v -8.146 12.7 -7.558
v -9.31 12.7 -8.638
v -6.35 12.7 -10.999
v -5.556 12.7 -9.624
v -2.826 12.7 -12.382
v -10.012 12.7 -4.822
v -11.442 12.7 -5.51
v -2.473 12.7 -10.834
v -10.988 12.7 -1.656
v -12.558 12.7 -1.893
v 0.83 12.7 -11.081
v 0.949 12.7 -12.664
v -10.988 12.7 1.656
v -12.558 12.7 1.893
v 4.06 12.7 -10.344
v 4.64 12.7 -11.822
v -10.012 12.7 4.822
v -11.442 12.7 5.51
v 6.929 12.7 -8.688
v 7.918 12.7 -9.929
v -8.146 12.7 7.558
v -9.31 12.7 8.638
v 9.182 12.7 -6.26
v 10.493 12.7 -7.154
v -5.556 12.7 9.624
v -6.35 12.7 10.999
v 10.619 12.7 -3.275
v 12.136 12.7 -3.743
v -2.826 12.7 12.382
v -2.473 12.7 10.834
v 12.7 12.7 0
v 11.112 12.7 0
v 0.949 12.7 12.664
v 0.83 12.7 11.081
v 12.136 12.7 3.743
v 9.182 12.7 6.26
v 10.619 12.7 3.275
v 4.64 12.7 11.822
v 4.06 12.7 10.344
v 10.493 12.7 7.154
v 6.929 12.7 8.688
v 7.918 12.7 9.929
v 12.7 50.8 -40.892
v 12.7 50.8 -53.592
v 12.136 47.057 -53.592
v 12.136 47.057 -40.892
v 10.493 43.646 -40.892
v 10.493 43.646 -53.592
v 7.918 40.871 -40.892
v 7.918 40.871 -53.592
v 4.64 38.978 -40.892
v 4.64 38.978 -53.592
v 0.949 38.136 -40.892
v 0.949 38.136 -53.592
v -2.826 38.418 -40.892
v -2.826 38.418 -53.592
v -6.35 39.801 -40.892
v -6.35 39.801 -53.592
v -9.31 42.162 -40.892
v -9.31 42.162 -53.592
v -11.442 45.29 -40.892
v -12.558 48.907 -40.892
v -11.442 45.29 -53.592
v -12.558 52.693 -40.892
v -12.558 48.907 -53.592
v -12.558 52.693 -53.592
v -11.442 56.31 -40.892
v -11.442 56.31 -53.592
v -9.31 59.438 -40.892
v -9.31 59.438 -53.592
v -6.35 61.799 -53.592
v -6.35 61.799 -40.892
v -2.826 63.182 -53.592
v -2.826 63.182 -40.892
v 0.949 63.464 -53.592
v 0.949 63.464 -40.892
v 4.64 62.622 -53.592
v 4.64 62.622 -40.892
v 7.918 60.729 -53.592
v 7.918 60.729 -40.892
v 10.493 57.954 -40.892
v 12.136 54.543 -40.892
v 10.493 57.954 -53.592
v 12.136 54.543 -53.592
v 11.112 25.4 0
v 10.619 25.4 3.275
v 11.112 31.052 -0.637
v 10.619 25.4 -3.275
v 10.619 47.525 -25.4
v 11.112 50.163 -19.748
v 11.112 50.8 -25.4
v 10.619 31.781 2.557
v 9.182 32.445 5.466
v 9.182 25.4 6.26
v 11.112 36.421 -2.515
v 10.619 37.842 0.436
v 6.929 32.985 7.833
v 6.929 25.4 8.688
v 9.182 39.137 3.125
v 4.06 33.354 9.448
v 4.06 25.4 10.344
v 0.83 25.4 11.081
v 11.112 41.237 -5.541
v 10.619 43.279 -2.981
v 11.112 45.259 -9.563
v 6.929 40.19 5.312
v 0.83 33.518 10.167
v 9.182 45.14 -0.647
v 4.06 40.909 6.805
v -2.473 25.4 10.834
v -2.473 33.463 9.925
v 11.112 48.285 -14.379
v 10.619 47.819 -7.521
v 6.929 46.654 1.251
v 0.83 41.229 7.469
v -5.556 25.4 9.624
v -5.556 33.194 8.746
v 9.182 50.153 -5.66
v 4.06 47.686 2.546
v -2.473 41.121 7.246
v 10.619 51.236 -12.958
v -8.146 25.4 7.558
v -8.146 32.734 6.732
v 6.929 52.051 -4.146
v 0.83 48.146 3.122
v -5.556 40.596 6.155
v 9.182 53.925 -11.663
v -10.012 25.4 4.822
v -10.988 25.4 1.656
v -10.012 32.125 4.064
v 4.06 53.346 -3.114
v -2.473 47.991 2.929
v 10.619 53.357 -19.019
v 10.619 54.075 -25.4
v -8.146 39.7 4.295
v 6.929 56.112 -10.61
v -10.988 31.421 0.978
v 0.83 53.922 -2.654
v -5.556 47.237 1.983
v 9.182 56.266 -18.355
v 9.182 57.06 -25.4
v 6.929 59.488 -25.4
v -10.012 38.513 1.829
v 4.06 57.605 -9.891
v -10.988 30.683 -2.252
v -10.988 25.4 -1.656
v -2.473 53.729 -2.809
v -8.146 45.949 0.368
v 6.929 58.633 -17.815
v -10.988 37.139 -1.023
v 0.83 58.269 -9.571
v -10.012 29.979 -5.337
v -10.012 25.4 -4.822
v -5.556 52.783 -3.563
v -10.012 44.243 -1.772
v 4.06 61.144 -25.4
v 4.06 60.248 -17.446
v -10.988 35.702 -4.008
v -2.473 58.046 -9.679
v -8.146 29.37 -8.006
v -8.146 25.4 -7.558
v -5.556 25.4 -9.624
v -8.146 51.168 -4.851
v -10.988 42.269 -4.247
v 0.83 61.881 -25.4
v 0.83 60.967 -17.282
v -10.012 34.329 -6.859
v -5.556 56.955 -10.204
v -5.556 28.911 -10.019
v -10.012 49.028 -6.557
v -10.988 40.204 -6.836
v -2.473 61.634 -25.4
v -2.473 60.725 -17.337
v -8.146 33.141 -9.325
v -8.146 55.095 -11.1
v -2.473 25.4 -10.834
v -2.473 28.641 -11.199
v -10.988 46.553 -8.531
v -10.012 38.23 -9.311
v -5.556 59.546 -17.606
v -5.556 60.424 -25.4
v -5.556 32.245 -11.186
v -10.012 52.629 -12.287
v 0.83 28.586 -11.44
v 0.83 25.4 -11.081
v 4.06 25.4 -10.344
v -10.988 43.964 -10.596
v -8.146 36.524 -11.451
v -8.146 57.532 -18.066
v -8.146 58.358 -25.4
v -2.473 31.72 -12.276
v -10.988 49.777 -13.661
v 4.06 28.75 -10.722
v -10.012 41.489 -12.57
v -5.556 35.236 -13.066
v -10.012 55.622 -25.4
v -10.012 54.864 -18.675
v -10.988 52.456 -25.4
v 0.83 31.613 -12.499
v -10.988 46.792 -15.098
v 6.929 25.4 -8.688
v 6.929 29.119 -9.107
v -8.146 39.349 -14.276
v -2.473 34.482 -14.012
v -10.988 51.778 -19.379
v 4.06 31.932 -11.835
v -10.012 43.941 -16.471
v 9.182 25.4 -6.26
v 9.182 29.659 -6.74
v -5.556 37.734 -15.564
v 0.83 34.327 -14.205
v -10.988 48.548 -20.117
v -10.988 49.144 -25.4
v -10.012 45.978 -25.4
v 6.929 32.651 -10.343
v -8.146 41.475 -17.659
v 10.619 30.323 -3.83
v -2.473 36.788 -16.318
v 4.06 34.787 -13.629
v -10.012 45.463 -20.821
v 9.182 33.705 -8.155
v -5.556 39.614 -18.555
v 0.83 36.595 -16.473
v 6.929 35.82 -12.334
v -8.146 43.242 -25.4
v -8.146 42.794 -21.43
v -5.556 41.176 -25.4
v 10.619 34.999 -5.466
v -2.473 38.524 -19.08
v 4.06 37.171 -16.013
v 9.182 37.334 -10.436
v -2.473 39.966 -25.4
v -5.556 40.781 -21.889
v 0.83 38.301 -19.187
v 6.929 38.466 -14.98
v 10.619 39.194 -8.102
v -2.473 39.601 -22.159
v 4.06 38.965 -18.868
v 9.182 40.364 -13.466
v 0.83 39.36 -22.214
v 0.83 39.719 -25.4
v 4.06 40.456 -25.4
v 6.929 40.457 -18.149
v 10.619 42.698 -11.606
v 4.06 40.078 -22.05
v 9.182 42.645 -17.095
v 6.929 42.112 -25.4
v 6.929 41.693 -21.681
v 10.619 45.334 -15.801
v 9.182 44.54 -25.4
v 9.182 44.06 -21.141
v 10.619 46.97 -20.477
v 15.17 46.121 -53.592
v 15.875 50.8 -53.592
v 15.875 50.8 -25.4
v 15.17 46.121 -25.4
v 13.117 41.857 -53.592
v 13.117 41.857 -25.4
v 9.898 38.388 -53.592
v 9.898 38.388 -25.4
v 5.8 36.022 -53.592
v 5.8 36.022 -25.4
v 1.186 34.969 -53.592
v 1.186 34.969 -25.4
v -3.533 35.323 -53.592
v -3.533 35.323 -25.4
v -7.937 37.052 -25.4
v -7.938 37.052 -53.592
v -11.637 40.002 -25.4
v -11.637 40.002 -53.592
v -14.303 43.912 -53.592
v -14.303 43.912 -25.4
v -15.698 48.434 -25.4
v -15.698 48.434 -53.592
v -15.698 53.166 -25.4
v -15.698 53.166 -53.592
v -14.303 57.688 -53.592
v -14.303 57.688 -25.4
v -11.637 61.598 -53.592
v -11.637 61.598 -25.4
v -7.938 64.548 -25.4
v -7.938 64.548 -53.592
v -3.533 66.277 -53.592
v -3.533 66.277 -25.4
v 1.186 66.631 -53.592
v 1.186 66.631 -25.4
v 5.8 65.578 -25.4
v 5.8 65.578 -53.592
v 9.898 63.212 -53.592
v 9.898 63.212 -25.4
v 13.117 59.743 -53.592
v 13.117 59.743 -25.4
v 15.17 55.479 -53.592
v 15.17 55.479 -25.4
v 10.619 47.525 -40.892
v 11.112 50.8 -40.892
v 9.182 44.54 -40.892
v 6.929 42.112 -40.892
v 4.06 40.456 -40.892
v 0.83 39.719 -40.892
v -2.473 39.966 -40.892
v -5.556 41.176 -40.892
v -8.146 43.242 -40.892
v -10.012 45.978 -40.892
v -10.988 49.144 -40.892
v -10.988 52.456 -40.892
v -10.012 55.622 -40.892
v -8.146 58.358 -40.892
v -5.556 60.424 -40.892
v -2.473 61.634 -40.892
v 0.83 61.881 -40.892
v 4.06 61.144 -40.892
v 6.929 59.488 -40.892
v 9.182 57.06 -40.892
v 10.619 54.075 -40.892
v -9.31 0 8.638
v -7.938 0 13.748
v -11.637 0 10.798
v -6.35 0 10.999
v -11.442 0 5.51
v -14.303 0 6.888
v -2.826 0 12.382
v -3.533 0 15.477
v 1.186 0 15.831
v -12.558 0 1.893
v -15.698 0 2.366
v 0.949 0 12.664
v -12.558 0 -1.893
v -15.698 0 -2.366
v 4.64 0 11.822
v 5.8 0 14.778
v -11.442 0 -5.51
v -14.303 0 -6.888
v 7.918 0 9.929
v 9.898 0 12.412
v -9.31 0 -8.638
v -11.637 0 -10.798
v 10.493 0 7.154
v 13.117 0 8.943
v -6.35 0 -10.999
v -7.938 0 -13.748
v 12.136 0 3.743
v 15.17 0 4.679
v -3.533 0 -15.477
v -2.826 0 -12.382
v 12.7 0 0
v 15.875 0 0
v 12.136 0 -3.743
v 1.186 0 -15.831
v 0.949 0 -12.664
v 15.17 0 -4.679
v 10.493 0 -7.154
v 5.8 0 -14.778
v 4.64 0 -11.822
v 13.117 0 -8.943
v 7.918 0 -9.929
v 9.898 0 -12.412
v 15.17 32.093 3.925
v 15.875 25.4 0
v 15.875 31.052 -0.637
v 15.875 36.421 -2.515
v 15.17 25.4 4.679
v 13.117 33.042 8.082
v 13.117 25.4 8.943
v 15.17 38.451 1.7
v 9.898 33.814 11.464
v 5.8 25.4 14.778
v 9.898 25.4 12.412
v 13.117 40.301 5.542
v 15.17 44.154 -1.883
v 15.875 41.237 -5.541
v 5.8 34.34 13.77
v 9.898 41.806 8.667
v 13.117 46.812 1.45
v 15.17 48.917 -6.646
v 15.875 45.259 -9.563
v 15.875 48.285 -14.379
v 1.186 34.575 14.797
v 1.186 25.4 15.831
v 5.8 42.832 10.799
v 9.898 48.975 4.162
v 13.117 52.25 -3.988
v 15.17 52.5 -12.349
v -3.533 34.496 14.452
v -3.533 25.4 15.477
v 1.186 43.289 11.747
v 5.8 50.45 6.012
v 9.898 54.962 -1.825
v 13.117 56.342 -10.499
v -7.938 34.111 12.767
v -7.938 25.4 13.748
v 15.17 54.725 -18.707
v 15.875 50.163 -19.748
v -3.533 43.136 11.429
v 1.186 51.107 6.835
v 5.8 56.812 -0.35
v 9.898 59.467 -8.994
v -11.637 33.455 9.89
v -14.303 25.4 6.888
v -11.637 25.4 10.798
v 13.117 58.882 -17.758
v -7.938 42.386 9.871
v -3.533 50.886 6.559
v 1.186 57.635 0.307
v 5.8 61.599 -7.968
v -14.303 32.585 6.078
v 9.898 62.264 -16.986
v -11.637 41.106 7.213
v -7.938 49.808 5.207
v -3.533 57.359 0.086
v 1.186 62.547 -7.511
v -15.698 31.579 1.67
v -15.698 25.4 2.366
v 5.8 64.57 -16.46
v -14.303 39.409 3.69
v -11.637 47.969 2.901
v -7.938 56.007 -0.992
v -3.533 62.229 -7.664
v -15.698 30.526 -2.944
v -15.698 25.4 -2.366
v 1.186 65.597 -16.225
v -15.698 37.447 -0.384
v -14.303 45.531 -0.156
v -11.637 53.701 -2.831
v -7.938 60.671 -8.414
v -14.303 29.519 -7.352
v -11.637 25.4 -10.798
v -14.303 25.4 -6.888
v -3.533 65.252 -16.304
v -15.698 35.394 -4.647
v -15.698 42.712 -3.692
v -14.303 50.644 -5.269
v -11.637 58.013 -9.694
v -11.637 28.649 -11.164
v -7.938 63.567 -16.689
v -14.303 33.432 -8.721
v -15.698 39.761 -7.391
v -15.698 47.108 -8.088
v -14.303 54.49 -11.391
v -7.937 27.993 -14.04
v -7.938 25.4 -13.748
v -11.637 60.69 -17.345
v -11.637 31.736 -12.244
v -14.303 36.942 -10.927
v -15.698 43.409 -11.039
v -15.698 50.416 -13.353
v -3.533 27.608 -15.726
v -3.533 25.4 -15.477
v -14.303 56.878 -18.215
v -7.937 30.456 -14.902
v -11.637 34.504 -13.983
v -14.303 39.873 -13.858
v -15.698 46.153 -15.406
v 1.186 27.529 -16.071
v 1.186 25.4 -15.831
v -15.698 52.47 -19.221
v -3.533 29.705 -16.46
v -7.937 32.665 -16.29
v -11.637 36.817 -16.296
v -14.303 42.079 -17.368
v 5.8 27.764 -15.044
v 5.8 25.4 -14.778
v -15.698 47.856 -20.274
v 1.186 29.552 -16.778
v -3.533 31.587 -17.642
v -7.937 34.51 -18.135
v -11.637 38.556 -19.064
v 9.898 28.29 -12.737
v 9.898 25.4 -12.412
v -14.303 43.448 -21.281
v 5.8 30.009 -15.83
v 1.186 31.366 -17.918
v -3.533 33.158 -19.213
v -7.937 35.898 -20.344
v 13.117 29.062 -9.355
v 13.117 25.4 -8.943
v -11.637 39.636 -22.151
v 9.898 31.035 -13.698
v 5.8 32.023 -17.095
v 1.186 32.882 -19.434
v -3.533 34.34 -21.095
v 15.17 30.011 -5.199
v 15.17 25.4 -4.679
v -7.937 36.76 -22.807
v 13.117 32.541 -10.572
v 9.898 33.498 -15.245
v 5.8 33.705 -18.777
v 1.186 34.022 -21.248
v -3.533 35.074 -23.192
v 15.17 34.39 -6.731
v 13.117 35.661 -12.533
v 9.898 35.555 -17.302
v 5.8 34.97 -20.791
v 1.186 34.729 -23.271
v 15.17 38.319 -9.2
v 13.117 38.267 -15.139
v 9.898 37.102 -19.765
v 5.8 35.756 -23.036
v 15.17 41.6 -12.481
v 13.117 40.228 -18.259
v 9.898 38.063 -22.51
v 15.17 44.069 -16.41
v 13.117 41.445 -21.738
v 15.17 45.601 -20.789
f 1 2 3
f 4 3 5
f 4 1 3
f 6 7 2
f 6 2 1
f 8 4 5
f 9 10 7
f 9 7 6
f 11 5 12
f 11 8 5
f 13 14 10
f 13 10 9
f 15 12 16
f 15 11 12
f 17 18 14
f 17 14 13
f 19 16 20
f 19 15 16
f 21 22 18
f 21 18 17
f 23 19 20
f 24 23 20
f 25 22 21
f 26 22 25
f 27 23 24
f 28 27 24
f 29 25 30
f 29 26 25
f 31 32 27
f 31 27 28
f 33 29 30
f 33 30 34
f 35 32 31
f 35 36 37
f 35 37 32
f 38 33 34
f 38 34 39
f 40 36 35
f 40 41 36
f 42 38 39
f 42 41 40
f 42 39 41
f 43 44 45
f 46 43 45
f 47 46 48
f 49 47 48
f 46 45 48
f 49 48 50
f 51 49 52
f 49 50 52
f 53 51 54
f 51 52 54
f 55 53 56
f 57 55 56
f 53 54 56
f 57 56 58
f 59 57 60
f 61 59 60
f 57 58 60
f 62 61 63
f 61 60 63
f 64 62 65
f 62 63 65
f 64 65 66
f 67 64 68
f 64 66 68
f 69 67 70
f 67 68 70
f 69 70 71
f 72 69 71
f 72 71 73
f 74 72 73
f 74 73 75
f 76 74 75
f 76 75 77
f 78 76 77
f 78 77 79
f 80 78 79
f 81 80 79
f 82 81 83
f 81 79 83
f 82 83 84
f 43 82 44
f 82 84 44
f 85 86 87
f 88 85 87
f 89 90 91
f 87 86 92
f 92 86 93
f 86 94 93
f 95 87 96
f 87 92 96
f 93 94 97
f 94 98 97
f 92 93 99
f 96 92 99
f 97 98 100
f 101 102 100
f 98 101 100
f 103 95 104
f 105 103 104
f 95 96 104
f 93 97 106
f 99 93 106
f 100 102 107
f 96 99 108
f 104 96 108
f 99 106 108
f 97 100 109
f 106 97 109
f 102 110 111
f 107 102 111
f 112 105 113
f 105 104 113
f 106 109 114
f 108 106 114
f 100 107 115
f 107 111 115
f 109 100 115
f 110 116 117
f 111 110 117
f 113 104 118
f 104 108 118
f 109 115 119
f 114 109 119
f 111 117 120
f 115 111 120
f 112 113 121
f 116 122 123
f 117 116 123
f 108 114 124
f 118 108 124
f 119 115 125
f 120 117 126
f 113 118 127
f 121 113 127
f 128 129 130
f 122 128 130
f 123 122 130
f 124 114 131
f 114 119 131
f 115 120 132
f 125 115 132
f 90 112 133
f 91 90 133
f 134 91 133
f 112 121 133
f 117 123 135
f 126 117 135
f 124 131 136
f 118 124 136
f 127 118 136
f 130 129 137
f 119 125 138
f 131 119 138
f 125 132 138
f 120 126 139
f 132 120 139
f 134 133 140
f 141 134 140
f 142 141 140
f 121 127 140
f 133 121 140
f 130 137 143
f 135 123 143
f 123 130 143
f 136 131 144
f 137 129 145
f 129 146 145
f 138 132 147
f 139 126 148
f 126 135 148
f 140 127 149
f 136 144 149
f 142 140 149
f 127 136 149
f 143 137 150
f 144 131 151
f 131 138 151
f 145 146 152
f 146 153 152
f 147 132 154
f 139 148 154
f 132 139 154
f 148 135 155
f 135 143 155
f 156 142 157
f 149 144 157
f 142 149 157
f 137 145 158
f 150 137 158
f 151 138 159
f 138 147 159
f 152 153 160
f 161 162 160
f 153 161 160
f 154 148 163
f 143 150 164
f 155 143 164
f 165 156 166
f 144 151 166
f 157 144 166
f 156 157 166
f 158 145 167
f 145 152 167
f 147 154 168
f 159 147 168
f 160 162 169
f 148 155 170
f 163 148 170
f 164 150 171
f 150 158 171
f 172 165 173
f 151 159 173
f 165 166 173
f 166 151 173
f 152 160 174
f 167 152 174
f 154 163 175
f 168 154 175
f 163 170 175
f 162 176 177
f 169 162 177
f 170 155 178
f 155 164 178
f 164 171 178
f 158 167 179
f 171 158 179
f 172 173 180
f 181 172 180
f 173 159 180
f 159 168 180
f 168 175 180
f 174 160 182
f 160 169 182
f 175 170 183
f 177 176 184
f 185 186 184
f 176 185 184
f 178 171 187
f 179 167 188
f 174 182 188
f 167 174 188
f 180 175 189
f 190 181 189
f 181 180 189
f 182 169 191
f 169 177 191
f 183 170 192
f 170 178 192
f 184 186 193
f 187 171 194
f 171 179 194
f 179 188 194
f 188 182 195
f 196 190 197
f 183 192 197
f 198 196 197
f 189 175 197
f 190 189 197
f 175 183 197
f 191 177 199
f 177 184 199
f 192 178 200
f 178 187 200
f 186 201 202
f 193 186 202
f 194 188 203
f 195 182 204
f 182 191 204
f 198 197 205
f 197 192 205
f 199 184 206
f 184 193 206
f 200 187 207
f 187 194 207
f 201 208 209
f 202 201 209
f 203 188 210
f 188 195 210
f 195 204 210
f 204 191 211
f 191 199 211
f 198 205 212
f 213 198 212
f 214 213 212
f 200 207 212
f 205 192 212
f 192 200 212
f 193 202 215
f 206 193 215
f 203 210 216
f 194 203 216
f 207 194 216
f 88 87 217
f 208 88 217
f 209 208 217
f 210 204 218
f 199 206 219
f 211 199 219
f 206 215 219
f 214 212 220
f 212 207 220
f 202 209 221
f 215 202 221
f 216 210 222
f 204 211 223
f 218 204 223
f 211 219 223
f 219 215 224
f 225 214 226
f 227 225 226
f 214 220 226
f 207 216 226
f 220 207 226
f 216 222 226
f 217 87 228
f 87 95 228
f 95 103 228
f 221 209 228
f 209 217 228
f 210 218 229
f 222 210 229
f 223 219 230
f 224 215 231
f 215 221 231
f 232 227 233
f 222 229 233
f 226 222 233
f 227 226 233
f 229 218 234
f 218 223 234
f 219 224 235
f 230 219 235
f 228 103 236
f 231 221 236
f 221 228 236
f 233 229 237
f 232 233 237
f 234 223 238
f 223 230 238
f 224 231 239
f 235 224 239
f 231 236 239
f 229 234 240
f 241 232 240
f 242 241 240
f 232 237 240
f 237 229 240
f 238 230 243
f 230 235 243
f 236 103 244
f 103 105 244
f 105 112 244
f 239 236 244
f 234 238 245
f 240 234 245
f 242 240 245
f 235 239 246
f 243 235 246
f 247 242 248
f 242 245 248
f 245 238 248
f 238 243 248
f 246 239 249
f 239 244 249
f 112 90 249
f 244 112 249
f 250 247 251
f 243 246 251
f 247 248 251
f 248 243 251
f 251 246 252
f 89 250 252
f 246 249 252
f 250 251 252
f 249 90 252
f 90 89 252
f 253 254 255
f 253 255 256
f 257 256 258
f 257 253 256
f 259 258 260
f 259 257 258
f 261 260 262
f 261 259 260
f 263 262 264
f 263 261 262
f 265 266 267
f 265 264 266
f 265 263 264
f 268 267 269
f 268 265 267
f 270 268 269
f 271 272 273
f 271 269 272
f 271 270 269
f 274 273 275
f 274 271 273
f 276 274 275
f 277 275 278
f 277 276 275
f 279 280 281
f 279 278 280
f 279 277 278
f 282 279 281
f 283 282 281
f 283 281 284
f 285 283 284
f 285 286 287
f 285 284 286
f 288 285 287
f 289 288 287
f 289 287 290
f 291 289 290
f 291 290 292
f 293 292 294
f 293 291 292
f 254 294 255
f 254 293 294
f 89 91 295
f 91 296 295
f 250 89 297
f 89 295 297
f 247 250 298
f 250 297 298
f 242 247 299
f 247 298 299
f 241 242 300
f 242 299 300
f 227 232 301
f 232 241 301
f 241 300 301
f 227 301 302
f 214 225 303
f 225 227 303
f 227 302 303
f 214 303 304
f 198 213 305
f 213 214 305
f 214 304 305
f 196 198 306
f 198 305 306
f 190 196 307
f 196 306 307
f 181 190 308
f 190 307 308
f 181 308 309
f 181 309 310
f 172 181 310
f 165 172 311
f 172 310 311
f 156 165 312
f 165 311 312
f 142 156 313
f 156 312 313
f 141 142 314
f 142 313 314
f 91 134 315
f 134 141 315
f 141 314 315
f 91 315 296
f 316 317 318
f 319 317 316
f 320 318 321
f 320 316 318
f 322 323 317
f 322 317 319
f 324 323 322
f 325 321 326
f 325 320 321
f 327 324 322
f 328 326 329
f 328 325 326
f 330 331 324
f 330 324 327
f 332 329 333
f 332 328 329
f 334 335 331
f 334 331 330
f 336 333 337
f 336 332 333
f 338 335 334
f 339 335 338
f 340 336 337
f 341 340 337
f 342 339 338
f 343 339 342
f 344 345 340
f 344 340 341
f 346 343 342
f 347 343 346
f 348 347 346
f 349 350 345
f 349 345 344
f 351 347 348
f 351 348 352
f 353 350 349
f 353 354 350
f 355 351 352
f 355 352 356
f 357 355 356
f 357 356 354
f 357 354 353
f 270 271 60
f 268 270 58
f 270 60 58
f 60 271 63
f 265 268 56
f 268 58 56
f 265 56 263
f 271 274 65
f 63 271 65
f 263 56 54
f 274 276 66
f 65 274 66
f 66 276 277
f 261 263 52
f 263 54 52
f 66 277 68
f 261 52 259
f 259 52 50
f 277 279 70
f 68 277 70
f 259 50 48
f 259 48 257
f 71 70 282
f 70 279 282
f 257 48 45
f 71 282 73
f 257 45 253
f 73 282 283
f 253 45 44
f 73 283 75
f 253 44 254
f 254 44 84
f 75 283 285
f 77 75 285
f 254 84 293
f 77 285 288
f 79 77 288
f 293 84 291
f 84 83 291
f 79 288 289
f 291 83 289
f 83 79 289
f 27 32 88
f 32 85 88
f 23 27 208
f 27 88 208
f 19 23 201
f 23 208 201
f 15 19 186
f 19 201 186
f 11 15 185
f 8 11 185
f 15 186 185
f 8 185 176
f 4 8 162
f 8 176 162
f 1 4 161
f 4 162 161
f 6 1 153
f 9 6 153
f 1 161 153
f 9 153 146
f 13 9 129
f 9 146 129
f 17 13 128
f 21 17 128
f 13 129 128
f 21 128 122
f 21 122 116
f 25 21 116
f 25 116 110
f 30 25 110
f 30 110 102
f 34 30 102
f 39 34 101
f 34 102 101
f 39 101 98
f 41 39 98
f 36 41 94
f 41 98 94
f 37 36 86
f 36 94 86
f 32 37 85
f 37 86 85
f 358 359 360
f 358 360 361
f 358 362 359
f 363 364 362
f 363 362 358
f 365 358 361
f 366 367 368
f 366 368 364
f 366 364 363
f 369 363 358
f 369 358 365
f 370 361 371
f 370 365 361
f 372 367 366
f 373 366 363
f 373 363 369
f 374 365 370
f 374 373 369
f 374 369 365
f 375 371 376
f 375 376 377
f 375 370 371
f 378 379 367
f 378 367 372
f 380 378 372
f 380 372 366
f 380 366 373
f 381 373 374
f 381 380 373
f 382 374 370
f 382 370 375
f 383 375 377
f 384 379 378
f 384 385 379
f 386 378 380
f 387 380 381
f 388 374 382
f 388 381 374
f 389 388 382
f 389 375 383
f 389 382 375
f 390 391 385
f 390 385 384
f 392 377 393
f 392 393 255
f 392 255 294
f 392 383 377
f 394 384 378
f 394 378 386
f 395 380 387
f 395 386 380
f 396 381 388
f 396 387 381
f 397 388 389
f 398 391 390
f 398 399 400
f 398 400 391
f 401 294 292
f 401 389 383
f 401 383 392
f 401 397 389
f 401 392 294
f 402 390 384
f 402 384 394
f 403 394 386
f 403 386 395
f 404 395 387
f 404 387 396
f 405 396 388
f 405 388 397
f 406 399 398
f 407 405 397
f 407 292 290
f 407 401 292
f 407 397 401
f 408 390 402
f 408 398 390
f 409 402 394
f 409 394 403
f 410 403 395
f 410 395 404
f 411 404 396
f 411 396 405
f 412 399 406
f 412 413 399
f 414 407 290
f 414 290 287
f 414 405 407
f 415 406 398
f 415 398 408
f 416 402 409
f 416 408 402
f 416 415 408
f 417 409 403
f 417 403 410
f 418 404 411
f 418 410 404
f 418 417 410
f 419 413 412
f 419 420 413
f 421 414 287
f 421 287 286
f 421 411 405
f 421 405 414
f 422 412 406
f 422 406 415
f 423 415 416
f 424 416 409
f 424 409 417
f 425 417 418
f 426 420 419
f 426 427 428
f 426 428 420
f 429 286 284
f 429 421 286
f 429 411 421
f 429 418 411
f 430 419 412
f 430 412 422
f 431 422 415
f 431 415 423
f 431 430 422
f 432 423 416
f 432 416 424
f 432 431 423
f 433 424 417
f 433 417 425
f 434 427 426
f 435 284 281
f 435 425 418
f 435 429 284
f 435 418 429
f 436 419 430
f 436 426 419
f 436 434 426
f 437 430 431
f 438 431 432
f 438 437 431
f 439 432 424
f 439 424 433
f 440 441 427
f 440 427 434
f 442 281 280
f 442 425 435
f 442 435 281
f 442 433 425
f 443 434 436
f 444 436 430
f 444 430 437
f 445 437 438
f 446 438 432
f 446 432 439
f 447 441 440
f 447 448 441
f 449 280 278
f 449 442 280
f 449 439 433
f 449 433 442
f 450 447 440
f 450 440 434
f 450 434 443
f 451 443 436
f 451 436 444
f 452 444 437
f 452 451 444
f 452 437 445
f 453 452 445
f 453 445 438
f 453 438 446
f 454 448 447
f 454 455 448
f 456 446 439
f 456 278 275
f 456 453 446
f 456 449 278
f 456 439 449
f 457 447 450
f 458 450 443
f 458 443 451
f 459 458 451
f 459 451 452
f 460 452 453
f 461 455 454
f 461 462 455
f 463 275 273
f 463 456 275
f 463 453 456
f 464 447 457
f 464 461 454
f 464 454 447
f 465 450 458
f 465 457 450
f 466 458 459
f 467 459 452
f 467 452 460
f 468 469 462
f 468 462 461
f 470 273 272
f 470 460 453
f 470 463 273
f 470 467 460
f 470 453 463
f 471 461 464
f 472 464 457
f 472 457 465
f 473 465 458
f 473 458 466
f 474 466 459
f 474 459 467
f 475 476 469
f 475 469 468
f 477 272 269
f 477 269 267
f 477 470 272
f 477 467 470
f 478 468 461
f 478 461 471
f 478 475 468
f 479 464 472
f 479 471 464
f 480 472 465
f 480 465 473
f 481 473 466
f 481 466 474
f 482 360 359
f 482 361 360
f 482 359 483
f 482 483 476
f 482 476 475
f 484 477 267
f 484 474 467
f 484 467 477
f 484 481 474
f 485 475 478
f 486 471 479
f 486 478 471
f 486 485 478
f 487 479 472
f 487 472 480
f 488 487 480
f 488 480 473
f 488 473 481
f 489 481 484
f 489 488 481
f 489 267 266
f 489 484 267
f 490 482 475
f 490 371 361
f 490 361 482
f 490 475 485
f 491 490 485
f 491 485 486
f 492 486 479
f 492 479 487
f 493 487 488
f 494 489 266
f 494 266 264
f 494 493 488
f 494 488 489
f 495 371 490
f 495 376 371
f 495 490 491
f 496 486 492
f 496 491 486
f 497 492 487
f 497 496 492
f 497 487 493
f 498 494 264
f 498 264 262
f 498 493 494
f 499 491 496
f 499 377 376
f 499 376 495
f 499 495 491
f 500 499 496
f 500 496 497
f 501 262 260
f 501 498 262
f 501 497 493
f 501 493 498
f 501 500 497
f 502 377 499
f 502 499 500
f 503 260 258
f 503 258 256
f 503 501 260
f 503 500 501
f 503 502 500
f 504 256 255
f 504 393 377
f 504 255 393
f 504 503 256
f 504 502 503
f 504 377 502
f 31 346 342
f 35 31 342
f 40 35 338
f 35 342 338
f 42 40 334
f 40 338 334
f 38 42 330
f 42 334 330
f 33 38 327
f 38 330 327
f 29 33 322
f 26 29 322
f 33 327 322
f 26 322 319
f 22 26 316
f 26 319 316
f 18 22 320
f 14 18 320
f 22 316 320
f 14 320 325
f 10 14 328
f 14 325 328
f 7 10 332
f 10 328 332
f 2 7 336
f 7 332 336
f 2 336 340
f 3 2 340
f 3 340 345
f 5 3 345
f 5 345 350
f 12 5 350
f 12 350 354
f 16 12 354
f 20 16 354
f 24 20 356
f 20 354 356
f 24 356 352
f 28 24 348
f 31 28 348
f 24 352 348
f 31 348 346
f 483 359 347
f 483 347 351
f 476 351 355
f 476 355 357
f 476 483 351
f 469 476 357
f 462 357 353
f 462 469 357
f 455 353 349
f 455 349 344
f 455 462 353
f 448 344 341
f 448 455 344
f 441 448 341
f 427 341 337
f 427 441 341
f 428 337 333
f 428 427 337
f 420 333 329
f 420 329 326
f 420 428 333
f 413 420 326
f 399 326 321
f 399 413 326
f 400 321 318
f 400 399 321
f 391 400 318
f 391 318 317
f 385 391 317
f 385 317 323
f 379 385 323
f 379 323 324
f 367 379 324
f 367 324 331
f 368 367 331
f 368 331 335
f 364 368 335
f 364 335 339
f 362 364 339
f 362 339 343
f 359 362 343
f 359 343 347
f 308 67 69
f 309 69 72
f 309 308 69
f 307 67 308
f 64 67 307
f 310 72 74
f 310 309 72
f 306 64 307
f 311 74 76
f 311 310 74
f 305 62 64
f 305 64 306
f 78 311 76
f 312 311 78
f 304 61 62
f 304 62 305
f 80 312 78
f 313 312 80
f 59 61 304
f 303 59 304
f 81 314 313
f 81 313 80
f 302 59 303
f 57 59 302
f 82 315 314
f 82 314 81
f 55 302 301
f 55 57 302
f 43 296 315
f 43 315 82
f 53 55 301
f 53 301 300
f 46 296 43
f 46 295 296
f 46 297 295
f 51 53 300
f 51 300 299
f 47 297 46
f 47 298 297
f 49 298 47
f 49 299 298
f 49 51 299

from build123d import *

# Parameters (mm, degrees)
F0_R     = 15.875
F0_R_2   = 11.1125
F3_R     = 12.7
F4_DEPTH = 12.7
F5_R     = 12.7
F6_DEPTH = 12.7


with BuildPart() as f2:
    # F2: sweep along a path in F1
    with BuildLine(Plane.YZ) as f2_path:
        Line((0, 0), (25.4, 0))
        ThreePointArc((25.4, 0), (43.3605122421, -7.4394877579), (50.8, -25.4))
        Line((50.8, -25.4), (50.8, -53.591504693))
    # F0 (on Front) → F2 (sweep)
    with BuildSketch(Plane.XZ):
        Circle(F0_R)
        Circle(F0_R_2, mode=Mode.SUBTRACT)
    sweep(path=f2_path.line)

    # F3 (on Front) → F4 (cut)
    with BuildSketch(Plane.XZ):
        Circle(F3_R)
    extrude(amount=-F4_DEPTH, mode=Mode.SUBTRACT)

    # F5 (on face) → F6 (cut)
    with BuildSketch(Plane(origin=(0, 0, -53.591504693), x_dir=(1, 0, 0), z_dir=(0, 0, -1))):
        with Locations((0, -50.8)):
            Circle(F5_R)
    extrude(amount=-F6_DEPTH, mode=Mode.SUBTRACT)


solid = f2.part
